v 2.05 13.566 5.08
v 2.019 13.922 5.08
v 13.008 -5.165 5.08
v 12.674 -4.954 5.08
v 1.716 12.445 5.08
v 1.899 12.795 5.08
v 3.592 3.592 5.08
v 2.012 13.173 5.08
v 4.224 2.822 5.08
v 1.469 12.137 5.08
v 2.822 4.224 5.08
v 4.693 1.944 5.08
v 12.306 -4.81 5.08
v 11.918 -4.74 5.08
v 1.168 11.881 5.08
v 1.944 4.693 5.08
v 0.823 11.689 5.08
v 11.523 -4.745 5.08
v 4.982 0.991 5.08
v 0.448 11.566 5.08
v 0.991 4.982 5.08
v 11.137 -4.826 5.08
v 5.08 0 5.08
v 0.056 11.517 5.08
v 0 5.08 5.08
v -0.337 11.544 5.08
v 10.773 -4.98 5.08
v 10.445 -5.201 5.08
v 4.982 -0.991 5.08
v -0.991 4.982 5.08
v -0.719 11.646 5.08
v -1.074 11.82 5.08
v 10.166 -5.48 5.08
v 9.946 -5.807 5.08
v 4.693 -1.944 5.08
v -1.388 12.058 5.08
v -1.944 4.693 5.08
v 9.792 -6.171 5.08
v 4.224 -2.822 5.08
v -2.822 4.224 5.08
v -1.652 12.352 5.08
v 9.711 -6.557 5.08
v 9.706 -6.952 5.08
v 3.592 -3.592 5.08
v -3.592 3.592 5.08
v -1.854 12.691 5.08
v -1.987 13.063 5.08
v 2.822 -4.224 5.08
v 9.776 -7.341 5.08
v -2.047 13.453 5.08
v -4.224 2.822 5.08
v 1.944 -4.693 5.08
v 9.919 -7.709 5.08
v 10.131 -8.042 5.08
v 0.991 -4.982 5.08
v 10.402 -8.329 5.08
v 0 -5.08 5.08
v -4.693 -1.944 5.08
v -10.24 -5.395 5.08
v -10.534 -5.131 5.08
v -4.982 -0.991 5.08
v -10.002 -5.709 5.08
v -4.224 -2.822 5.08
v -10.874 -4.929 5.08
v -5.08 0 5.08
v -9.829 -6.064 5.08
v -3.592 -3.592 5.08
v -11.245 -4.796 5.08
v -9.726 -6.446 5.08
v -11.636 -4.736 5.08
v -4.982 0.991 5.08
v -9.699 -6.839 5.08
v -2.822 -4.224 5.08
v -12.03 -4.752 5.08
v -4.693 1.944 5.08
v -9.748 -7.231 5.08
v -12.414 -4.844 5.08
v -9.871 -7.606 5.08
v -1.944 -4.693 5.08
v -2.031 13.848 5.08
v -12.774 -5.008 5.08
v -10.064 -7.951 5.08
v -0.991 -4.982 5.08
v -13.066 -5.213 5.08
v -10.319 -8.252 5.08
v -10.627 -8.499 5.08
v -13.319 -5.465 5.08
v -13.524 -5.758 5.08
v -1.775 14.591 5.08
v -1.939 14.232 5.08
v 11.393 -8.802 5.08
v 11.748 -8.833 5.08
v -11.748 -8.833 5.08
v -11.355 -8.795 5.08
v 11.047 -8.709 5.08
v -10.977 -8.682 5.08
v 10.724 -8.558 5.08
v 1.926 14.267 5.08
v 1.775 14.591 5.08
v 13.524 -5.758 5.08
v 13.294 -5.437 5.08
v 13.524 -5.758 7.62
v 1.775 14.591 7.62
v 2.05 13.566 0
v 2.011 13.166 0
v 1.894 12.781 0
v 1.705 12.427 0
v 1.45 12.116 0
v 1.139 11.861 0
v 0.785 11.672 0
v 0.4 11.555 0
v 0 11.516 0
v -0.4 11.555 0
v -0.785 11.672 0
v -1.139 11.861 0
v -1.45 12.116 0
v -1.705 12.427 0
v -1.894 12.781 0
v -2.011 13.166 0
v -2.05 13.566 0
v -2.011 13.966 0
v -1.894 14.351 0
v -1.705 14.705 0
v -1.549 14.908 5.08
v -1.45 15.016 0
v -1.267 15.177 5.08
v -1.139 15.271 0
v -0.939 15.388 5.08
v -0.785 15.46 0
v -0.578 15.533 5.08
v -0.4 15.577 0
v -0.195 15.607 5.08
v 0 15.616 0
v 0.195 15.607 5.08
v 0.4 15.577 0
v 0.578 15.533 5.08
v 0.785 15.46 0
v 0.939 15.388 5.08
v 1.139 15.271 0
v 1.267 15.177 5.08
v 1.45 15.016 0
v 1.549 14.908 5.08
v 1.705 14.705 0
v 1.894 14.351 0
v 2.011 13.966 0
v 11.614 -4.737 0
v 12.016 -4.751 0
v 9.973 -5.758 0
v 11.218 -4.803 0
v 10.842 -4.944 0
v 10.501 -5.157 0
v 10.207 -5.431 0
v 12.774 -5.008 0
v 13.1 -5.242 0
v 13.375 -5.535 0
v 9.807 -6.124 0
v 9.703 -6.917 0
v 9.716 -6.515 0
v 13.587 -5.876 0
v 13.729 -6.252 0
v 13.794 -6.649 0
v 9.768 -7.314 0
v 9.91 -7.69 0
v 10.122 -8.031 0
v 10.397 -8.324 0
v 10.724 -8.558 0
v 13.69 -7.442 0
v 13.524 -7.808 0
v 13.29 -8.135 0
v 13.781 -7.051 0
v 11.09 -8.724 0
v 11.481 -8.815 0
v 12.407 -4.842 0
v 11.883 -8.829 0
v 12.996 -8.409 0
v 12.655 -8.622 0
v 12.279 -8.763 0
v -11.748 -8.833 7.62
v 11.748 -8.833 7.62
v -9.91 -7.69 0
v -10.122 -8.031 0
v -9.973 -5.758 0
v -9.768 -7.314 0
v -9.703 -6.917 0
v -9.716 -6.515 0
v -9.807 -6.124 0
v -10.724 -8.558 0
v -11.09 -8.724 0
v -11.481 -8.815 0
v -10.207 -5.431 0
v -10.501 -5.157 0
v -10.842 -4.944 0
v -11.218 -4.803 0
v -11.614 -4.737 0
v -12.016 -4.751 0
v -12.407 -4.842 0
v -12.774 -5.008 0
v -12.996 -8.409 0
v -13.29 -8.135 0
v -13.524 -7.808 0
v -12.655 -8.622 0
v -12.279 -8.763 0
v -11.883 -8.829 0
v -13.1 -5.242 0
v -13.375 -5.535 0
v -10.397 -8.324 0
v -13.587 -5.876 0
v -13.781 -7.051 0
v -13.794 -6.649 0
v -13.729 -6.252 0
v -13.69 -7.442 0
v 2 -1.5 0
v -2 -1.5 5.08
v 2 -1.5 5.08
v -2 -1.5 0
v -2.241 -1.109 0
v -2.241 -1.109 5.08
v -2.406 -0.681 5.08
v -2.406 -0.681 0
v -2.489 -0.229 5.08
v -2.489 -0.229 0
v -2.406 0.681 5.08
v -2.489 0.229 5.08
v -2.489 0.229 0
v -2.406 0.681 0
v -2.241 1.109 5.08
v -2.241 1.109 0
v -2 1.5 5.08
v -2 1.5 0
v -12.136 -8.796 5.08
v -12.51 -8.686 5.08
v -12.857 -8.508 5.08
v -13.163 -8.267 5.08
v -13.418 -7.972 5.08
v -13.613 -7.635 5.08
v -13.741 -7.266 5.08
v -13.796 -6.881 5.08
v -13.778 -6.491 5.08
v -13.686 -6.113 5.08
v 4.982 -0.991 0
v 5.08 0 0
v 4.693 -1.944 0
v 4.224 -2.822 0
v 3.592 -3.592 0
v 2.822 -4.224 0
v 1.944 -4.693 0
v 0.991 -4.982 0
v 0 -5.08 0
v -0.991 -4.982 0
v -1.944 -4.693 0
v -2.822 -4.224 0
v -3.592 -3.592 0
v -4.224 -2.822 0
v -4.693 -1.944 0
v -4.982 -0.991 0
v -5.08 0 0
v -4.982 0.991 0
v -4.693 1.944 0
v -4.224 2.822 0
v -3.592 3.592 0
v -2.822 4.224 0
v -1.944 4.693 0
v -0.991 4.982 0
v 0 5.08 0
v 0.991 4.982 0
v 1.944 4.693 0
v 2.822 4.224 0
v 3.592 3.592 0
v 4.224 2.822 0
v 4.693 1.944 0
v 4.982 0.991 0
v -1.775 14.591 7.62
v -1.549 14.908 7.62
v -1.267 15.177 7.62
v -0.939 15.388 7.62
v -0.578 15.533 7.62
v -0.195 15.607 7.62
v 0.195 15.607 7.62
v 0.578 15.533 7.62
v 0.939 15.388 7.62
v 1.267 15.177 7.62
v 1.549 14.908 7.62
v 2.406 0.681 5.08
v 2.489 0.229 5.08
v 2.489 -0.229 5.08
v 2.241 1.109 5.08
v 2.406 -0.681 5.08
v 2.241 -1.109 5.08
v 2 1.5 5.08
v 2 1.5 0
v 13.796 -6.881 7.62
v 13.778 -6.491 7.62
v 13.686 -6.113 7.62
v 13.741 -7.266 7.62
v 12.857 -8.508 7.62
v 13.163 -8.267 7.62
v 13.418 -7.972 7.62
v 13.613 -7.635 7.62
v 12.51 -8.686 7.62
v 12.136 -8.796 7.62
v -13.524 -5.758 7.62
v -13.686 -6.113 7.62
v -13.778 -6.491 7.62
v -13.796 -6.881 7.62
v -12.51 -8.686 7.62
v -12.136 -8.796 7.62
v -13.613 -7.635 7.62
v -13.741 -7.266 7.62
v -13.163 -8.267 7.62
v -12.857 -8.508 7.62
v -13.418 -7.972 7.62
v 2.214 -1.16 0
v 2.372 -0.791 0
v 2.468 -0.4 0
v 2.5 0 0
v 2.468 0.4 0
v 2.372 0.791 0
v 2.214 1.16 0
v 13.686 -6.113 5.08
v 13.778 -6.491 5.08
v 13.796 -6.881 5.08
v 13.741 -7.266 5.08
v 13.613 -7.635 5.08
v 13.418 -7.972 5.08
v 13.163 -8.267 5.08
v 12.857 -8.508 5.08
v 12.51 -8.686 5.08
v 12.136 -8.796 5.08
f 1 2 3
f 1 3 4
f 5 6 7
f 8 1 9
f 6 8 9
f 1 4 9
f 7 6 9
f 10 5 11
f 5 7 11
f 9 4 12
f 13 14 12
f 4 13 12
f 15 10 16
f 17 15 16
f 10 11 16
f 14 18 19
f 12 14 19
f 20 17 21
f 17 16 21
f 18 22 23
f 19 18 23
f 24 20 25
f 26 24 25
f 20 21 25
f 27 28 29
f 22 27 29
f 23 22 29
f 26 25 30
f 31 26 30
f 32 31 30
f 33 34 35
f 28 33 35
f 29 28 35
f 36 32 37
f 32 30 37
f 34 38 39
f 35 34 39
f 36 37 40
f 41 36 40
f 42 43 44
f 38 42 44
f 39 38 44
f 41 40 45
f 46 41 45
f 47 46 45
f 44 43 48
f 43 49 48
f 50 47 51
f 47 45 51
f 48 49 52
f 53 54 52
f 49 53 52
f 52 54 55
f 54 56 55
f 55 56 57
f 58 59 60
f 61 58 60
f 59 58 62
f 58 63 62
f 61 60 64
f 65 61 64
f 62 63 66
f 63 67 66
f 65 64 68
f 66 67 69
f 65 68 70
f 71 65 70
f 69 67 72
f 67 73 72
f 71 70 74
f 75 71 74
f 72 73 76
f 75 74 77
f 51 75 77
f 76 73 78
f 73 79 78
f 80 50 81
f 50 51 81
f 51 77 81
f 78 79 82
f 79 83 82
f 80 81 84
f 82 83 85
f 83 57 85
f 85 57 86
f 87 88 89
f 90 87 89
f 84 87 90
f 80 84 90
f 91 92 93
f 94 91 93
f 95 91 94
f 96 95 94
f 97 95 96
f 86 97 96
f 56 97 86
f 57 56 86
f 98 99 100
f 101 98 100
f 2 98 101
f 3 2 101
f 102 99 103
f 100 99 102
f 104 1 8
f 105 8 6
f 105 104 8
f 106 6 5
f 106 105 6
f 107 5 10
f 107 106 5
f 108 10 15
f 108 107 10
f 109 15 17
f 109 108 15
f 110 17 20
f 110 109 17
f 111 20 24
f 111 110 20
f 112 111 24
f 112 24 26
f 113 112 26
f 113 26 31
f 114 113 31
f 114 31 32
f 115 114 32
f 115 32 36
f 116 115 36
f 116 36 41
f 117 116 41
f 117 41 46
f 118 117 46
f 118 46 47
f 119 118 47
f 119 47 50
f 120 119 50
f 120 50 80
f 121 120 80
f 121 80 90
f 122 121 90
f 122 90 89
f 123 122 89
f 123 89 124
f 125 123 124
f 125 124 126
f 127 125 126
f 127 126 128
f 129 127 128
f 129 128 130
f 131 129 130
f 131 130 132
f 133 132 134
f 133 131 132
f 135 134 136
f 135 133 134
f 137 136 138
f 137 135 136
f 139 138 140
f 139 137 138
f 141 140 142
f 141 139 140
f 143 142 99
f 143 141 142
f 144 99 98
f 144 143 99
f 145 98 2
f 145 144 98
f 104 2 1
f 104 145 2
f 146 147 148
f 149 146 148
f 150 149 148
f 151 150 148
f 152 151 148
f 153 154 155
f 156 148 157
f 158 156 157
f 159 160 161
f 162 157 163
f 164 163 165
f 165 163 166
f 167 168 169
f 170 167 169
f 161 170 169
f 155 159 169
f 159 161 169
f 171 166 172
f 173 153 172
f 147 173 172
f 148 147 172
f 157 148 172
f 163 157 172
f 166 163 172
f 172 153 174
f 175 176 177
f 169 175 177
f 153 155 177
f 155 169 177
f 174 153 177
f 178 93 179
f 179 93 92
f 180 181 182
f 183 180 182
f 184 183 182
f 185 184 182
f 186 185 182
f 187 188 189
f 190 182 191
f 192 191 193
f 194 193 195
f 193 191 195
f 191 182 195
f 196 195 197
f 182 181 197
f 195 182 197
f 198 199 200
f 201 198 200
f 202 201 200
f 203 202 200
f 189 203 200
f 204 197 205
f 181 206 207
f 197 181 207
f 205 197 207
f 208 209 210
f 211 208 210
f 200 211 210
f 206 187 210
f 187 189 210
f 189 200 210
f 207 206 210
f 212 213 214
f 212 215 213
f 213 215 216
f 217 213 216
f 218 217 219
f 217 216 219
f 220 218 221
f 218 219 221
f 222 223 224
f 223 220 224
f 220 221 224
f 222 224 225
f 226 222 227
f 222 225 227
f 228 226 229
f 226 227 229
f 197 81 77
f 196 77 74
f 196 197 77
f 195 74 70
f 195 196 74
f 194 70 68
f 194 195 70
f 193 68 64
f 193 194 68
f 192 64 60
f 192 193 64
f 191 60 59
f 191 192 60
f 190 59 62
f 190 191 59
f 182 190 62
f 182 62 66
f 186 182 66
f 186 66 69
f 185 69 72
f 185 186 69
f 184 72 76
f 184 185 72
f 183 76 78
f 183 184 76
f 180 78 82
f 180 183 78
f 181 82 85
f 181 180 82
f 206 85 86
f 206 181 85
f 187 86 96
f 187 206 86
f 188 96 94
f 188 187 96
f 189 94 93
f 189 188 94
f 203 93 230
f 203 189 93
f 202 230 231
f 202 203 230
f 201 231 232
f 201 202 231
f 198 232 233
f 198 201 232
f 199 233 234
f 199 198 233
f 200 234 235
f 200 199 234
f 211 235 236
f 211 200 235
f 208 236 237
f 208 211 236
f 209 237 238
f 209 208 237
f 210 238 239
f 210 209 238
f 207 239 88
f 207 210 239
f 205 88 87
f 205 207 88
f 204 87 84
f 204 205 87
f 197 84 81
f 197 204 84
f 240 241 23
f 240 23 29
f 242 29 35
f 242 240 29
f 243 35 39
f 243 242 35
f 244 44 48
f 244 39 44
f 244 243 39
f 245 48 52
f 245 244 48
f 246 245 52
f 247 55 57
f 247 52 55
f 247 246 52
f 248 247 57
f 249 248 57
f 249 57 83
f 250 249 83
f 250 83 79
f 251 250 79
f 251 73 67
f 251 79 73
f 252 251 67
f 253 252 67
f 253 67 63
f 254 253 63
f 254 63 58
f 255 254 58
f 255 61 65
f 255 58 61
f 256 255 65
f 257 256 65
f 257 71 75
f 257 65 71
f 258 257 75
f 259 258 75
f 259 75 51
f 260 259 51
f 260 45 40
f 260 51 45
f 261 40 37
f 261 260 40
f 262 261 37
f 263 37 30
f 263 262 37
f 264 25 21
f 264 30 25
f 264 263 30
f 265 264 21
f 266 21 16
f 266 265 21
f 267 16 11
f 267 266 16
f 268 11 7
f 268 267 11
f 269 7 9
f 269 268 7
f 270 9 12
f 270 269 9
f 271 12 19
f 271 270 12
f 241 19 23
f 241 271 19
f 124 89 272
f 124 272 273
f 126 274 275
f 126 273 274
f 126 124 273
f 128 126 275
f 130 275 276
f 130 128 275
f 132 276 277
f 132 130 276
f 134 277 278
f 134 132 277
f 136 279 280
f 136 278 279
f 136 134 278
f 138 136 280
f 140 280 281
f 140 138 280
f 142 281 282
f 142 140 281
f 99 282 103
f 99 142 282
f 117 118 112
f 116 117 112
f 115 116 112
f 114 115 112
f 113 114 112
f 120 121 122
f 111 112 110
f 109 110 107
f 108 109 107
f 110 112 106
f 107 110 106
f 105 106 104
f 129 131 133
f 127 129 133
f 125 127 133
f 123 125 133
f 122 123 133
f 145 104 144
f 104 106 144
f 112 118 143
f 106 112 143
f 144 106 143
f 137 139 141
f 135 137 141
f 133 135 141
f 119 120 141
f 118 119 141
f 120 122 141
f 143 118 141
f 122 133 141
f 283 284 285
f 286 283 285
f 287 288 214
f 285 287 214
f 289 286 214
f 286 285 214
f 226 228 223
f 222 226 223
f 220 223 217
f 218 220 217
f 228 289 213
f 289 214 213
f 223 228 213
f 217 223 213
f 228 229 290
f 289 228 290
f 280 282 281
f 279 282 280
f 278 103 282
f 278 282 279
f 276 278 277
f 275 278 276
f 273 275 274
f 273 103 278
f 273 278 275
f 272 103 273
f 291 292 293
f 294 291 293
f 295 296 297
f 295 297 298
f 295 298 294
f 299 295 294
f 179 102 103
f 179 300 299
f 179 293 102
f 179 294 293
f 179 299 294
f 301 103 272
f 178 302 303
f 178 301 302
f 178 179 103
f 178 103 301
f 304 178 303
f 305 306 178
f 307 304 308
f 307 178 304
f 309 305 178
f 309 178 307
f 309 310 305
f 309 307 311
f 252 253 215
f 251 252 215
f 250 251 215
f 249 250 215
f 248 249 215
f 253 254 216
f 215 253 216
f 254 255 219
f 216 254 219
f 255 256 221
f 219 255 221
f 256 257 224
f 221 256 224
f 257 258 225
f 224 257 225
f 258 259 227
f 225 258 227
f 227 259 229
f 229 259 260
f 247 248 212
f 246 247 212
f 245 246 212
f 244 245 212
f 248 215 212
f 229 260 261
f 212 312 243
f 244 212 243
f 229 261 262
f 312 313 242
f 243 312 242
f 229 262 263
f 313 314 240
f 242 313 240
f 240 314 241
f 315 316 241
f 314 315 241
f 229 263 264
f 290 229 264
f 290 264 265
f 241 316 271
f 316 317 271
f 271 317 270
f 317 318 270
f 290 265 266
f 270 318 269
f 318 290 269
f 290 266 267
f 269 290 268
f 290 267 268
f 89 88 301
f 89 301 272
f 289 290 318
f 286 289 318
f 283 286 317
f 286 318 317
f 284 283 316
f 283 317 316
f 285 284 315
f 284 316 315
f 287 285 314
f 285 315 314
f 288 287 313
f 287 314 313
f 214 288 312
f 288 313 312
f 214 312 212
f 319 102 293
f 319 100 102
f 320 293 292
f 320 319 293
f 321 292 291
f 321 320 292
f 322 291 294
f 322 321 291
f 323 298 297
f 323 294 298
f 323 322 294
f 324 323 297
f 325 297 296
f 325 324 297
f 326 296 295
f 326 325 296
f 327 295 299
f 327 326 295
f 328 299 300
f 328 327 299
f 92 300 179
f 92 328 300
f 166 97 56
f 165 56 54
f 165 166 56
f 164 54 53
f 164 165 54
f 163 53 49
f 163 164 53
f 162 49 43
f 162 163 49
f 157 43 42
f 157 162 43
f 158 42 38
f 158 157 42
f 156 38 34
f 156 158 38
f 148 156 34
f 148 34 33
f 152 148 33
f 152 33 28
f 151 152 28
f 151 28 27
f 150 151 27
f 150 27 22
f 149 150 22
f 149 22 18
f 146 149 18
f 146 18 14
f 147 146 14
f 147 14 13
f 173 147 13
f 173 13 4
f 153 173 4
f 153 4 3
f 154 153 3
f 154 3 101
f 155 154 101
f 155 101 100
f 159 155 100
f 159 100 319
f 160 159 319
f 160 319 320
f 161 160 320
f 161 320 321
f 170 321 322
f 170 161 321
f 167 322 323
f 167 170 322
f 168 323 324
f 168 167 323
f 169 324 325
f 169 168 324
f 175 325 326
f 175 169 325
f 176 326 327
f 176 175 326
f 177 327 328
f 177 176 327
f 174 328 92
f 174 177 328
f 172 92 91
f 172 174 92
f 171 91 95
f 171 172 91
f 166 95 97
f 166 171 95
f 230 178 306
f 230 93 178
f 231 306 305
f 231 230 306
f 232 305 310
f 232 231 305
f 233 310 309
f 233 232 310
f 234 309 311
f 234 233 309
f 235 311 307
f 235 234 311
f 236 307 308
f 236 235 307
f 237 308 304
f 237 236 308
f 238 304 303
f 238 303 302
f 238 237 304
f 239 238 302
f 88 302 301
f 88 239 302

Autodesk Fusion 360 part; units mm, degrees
sketch "Sketch1" plane through (0, 0, 0) normal (0, 0, 1) x (1, 0, 0)
  circle A0 centre (0, 0) radius 21.59 construction
  line L0 (0, 27.546) -> (0, -31.973) construction
  line L1 (-40.4824, 0) -> (36.5438, 0) construction
  line L2 (0, 1.75) -> (0, 22.5)
  line L3 (1.75, 0) -> (22.5, 0)
  line L4 (-2, 1.5) -> (2, 1.5)
  line L5 (-2, -1.5) -> (2, -1.5)
  circle A1 centre (0, 0) radius 5.08
  arc A2 (-2, 1.5) -> (-2, -1.5) centre (0, 0) ccw
  arc A3 (2, -1.5) -> (2, 1.5) centre (0, 0) ccw
  circle A4 centre (0, 13.566) radius 6.5 construction
  circle A5 centre (0, 13.566) radius 2.05
  line L6 (7.62, 20.066) -> (-7.158, 20.066) construction
  line L7 (-11.43, 21.59) -> (19.6746, 21.59) construction
  dimension "d1" = 43.18
  dimension "d3" = 5
  dimension "d4" = 3
  dimension "d5" = 10.16
  dimension "d6" = 2.5
  dimension "d7" = 13
  dimension "d8" = 4.1
  dimension "d18" = 1.524
extrude "Extrude1" add sketch "Sketch1" along normal blind 5.08 makes body 1 at (2.0475, 13.4638, 3.3867) makes body 2 at (5.0737, -0.2532, 3.3867)
pattern_circular "C-Pattern4" count 3 over 360 about axis through (0, 0, 1.75) along (0, 0, 1) of bodies 1 makes body 3 at (-12.6837, -4.9588, 3.3867) makes body 4 at (10.6363, -8.5051, 3.3867)
sketch "Sketch3" plane through (0, 0, 5.08) normal (0, 0, 1) x (-1, 0, 0)
  arc A0 (2, -1.5) -> (2, 1.5) centre (0, 0) ccw
  line L0 (2, -1.5) -> (-2, -1.5)
  arc A1 (-2, 1.5) -> (-2, -1.5) centre (0, 0) ccw
  line L1 (-2, 1.5) -> (2, 1.5)
  circle A2 centre (0, 0) radius 5.08
  line L2 (13.5239, 5.758) -> (1.7754, -14.591)
  line L3 (-1.7754, -14.591) -> (-13.5239, 5.758)
  line L4 (11.7485, 8.833) -> (-11.7485, 8.833)
  circle A3 centre (11.7485, 6.783) radius 2.05
  circle A4 centre (0, -13.566) radius 2.05
  circle A5 centre (-11.7485, 6.783) radius 2.05
extrude "Extrude4" add sketch "Sketch3" along normal blind 2.54 contours A0 L0 A1 L1 | A2 | L2 L3 L4 A3 A4 A5 | A3 | A4 | A5 bodies 1 2 3 4
